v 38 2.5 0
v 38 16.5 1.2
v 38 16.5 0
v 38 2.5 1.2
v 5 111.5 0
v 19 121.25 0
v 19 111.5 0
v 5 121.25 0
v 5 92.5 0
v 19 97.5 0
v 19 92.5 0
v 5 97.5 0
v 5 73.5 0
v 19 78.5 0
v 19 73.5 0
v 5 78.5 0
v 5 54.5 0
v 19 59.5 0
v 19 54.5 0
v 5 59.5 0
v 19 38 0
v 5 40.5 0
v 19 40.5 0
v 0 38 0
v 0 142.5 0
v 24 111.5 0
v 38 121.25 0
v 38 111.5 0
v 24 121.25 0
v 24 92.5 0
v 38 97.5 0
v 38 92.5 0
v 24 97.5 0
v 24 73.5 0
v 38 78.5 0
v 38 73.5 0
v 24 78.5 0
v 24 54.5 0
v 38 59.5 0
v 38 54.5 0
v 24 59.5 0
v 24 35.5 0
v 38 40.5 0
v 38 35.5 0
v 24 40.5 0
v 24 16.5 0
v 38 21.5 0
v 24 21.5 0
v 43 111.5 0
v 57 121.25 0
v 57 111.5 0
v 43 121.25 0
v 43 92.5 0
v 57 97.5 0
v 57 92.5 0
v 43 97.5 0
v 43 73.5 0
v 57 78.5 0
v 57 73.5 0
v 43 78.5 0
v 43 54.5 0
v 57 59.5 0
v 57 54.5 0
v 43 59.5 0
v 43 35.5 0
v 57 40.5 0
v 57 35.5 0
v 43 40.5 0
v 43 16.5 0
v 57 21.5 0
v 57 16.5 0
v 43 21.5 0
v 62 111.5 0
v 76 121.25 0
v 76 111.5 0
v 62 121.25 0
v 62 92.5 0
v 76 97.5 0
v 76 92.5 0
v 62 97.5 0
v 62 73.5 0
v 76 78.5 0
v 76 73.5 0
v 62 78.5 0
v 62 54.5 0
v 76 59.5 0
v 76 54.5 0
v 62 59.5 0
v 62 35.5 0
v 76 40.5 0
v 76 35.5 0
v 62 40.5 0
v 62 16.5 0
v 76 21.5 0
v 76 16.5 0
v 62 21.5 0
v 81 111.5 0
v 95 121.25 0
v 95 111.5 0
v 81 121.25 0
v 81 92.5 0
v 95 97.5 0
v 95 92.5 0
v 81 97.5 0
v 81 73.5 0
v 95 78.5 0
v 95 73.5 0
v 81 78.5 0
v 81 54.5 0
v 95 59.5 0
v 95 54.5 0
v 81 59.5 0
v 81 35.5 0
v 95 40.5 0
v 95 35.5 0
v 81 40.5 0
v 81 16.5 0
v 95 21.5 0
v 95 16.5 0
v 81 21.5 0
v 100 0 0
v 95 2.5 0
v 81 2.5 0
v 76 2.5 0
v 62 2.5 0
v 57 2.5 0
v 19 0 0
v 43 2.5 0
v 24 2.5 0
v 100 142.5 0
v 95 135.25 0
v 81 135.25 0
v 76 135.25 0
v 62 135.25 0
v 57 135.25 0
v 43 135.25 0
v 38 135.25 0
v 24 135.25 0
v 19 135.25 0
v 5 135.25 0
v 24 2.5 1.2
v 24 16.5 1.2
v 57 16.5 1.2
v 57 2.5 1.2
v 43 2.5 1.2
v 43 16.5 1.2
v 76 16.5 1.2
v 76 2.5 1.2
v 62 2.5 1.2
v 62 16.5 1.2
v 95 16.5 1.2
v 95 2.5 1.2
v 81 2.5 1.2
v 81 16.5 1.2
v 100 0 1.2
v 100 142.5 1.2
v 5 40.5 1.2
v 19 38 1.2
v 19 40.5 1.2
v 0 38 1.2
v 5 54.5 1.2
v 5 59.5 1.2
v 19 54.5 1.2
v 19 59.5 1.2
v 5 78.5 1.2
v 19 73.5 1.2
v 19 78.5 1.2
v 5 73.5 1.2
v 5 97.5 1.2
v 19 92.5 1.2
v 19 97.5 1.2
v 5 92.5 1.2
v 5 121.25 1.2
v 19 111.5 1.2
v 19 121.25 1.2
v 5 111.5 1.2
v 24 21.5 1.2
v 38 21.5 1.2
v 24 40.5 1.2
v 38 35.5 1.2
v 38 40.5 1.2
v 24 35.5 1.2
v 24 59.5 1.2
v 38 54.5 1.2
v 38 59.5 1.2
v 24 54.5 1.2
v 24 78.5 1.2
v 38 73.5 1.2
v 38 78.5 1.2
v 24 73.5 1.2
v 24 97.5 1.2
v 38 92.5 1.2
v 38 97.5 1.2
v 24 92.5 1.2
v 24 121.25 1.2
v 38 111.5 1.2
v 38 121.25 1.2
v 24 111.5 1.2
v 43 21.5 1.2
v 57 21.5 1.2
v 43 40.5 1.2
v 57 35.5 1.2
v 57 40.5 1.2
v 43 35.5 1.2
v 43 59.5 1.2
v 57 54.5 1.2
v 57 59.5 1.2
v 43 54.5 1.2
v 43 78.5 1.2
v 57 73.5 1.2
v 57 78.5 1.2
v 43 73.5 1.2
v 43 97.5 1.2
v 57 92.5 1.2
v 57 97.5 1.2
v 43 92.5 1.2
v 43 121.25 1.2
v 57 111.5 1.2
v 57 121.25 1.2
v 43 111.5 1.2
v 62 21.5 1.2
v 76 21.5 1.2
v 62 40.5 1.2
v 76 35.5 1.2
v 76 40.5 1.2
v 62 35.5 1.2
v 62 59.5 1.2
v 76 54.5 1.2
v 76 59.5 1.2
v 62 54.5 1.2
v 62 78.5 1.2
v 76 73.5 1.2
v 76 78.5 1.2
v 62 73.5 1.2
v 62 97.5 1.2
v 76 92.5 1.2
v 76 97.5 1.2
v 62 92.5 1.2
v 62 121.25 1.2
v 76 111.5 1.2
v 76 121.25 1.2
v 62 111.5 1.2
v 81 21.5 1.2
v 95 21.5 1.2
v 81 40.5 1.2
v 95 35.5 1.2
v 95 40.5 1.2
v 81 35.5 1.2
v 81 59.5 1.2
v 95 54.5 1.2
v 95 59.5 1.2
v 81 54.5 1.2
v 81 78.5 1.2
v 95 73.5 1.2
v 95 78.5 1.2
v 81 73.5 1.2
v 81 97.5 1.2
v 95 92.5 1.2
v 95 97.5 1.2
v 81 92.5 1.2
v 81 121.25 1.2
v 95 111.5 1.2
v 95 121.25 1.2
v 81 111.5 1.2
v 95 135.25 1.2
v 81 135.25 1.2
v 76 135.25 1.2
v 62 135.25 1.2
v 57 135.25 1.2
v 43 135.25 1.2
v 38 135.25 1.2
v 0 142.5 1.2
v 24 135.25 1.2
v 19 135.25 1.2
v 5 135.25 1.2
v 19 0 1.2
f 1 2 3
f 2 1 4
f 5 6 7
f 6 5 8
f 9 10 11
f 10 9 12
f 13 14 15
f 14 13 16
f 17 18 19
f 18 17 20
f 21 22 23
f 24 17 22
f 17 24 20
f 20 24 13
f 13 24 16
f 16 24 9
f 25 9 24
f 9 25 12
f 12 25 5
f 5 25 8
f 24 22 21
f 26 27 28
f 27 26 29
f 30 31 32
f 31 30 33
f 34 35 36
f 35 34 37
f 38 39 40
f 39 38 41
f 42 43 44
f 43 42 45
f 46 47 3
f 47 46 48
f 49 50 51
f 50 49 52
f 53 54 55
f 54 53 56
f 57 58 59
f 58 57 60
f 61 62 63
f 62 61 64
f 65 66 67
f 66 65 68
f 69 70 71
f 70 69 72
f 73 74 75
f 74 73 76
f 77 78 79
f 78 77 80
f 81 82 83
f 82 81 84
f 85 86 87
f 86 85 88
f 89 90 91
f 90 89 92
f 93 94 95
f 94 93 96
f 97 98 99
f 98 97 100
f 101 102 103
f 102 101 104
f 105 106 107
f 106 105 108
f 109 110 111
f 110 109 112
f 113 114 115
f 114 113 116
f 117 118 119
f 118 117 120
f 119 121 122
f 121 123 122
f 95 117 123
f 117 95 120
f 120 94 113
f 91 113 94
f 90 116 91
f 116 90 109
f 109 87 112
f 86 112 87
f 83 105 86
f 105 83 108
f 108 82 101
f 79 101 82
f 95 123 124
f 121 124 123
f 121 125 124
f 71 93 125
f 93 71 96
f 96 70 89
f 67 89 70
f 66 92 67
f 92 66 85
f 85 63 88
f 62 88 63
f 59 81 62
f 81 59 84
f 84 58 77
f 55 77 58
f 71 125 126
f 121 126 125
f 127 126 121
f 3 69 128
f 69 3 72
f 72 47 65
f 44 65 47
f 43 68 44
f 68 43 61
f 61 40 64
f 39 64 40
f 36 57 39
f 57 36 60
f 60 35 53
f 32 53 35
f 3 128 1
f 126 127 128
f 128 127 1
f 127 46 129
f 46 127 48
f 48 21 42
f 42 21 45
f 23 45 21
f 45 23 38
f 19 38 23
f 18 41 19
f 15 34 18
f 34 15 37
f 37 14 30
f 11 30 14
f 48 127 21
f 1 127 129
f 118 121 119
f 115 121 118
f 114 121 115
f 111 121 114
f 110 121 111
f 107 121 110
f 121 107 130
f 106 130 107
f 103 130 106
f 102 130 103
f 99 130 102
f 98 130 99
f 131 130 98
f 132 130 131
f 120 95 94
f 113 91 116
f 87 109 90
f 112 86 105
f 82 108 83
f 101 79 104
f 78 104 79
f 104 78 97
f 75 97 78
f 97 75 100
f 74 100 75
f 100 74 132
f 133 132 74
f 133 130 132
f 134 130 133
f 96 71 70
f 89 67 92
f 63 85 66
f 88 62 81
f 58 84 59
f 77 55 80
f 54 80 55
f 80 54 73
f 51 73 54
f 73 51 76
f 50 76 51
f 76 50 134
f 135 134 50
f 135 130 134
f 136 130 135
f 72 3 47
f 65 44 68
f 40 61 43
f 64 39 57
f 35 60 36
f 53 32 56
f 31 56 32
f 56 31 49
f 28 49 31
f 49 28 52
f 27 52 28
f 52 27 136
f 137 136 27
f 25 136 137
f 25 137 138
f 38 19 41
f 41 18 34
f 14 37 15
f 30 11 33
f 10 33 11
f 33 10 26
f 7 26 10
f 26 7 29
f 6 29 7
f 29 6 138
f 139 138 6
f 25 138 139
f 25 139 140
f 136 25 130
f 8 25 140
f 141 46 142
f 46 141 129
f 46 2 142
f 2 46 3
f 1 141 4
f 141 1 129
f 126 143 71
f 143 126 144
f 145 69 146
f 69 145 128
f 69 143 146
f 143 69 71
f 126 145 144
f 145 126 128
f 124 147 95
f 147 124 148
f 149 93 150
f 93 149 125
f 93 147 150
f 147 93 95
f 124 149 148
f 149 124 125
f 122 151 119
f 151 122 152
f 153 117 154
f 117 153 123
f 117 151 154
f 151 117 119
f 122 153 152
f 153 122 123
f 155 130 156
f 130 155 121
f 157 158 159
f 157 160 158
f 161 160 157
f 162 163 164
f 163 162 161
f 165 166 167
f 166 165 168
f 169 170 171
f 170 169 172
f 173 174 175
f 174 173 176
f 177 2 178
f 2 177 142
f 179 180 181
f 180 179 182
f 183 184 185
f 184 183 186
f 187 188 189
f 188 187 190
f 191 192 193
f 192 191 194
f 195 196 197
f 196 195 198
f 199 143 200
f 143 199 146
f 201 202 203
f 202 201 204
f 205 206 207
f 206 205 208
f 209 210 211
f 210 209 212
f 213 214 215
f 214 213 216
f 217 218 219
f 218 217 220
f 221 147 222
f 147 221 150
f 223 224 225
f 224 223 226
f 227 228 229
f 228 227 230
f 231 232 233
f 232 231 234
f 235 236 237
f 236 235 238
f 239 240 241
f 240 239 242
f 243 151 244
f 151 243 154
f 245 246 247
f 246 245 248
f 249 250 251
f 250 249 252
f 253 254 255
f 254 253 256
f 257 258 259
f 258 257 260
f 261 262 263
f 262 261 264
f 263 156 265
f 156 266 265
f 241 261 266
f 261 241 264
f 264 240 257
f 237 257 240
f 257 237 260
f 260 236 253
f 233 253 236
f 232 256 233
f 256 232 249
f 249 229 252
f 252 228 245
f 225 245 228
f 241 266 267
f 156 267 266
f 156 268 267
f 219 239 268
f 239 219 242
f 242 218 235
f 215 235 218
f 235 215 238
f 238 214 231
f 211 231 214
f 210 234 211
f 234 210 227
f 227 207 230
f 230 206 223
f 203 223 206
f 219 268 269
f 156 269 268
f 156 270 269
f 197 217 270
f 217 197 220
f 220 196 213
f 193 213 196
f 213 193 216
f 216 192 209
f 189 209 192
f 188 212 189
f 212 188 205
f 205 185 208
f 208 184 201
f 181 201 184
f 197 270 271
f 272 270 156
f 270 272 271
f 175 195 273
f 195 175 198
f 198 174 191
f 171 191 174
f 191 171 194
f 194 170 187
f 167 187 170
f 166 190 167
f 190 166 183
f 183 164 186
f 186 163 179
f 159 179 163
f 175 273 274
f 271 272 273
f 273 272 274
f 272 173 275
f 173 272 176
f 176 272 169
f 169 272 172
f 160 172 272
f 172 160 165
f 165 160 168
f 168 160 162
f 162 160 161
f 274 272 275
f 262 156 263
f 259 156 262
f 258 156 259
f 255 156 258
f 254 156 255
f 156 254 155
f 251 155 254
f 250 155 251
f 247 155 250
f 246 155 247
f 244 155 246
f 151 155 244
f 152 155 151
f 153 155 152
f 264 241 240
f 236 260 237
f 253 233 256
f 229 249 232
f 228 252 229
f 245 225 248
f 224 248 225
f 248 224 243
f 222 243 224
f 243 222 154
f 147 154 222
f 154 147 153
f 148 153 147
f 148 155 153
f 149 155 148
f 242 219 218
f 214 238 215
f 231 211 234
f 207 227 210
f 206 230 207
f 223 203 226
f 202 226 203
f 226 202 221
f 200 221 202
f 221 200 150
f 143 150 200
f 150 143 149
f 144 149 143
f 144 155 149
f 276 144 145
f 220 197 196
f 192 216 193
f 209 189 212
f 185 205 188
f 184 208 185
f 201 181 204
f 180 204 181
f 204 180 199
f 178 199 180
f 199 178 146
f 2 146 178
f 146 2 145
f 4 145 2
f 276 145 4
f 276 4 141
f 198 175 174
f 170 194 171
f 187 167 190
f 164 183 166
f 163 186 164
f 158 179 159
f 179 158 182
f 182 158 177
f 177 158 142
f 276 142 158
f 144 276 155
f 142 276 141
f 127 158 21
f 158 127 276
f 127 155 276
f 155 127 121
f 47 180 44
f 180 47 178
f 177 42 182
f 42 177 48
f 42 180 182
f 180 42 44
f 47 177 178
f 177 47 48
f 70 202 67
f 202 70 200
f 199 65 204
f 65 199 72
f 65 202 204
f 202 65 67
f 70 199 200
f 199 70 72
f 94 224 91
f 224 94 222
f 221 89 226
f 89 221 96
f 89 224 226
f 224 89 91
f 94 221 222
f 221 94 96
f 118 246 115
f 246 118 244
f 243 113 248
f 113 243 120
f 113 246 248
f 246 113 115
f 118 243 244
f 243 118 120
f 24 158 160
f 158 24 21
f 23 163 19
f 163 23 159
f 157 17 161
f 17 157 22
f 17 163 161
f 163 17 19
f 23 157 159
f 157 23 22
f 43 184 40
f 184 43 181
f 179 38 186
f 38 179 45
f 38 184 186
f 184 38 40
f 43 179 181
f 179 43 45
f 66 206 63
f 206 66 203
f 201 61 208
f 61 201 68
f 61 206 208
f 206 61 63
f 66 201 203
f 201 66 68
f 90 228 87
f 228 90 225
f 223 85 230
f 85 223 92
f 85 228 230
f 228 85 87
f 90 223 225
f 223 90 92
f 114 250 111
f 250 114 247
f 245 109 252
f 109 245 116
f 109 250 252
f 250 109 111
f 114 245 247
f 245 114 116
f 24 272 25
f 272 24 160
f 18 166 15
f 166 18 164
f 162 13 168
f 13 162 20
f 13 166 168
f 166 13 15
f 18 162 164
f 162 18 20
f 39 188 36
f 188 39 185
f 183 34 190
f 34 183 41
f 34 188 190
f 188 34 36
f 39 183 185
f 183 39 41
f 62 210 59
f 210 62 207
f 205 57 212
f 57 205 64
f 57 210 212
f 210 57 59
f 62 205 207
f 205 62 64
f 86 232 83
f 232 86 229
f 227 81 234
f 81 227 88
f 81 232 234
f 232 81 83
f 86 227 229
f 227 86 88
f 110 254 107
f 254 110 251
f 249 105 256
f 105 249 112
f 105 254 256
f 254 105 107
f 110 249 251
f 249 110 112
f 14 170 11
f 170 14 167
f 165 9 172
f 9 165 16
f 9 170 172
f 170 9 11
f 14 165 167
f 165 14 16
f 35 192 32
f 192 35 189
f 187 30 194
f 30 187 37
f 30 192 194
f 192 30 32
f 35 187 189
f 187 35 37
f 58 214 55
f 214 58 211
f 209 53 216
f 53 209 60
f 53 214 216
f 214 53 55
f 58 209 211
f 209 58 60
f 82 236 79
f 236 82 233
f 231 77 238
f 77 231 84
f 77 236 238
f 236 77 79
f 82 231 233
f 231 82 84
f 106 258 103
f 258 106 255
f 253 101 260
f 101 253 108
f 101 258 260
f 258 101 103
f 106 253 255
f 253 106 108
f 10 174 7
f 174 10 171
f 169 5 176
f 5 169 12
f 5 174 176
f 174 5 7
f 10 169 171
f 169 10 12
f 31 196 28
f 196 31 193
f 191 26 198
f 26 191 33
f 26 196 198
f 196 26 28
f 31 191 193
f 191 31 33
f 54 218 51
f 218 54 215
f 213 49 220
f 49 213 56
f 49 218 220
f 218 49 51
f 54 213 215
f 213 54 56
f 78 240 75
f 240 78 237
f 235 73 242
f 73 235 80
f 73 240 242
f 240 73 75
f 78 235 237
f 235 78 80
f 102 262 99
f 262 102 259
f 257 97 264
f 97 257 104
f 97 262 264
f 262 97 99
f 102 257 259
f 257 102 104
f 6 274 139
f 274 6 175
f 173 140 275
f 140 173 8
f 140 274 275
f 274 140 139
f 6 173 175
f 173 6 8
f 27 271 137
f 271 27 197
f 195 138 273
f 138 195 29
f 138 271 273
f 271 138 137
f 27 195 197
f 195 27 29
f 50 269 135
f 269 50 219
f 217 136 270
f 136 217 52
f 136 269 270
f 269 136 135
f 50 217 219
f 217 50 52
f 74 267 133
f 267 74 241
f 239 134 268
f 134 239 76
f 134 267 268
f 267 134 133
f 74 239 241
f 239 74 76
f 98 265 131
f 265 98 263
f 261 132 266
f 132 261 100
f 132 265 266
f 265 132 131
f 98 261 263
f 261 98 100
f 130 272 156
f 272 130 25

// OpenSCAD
// file: ortholinear-plate.scad
switchHoleEdge = 14;
thickness = 5;
u = 19;

function holeSpacing (u1, u2) = ((u1 * u / 2) + (u2 * u/ 2)) - switchHoleEdge;

uHoleSpacing = holeSpacing(1, 1);

module switchColumn (rows, keySize, plateThickness) {
  difference () {
    cube([
      rows * (switchHoleEdge + holeSpacing(1, 1)) + holeSpacing(1, 1),
      keySize * u,
      plateThickness
    ]);
    translate([
      0,
      ((keySize * u) / 2) - (switchHoleEdge / 2),
      0,
    ]) switchColumnNegative(rows, plateThickness + 1);
  }
}

module switchColumnNegative (rows, plateThickness) {
  for (row = [1 : rows]) {
    translate([
      ((row - 1) * (holeSpacing(1, 1) + switchHoleEdge)) + holeSpacing(1, 1),
      0,
      0,
    ]) cube([switchHoleEdge, switchHoleEdge, plateThickness]);
  }
}

module ortholinearPlate(rows, columns, plateThickness) {
  switchColumn(rows, columns[0], plateThickness);
  if (len(columns) > 1) {
    translate([0, u * columns[0], 0]) {
      ortholinearPlate(rows, [ for (i = [1 : len(columns) - 1]) columns[i] ], plateThickness);
    }
  }
}
// main file
include <ortholinear-plate.scad>
  translate([u, 0, 0]) ortholinearPlate(4, [1, 1], 1.2);
  translate([0, 2 * u, 0]) ortholinearPlate(5, [1, 1, 1, 1, 1.5], 1.2);
